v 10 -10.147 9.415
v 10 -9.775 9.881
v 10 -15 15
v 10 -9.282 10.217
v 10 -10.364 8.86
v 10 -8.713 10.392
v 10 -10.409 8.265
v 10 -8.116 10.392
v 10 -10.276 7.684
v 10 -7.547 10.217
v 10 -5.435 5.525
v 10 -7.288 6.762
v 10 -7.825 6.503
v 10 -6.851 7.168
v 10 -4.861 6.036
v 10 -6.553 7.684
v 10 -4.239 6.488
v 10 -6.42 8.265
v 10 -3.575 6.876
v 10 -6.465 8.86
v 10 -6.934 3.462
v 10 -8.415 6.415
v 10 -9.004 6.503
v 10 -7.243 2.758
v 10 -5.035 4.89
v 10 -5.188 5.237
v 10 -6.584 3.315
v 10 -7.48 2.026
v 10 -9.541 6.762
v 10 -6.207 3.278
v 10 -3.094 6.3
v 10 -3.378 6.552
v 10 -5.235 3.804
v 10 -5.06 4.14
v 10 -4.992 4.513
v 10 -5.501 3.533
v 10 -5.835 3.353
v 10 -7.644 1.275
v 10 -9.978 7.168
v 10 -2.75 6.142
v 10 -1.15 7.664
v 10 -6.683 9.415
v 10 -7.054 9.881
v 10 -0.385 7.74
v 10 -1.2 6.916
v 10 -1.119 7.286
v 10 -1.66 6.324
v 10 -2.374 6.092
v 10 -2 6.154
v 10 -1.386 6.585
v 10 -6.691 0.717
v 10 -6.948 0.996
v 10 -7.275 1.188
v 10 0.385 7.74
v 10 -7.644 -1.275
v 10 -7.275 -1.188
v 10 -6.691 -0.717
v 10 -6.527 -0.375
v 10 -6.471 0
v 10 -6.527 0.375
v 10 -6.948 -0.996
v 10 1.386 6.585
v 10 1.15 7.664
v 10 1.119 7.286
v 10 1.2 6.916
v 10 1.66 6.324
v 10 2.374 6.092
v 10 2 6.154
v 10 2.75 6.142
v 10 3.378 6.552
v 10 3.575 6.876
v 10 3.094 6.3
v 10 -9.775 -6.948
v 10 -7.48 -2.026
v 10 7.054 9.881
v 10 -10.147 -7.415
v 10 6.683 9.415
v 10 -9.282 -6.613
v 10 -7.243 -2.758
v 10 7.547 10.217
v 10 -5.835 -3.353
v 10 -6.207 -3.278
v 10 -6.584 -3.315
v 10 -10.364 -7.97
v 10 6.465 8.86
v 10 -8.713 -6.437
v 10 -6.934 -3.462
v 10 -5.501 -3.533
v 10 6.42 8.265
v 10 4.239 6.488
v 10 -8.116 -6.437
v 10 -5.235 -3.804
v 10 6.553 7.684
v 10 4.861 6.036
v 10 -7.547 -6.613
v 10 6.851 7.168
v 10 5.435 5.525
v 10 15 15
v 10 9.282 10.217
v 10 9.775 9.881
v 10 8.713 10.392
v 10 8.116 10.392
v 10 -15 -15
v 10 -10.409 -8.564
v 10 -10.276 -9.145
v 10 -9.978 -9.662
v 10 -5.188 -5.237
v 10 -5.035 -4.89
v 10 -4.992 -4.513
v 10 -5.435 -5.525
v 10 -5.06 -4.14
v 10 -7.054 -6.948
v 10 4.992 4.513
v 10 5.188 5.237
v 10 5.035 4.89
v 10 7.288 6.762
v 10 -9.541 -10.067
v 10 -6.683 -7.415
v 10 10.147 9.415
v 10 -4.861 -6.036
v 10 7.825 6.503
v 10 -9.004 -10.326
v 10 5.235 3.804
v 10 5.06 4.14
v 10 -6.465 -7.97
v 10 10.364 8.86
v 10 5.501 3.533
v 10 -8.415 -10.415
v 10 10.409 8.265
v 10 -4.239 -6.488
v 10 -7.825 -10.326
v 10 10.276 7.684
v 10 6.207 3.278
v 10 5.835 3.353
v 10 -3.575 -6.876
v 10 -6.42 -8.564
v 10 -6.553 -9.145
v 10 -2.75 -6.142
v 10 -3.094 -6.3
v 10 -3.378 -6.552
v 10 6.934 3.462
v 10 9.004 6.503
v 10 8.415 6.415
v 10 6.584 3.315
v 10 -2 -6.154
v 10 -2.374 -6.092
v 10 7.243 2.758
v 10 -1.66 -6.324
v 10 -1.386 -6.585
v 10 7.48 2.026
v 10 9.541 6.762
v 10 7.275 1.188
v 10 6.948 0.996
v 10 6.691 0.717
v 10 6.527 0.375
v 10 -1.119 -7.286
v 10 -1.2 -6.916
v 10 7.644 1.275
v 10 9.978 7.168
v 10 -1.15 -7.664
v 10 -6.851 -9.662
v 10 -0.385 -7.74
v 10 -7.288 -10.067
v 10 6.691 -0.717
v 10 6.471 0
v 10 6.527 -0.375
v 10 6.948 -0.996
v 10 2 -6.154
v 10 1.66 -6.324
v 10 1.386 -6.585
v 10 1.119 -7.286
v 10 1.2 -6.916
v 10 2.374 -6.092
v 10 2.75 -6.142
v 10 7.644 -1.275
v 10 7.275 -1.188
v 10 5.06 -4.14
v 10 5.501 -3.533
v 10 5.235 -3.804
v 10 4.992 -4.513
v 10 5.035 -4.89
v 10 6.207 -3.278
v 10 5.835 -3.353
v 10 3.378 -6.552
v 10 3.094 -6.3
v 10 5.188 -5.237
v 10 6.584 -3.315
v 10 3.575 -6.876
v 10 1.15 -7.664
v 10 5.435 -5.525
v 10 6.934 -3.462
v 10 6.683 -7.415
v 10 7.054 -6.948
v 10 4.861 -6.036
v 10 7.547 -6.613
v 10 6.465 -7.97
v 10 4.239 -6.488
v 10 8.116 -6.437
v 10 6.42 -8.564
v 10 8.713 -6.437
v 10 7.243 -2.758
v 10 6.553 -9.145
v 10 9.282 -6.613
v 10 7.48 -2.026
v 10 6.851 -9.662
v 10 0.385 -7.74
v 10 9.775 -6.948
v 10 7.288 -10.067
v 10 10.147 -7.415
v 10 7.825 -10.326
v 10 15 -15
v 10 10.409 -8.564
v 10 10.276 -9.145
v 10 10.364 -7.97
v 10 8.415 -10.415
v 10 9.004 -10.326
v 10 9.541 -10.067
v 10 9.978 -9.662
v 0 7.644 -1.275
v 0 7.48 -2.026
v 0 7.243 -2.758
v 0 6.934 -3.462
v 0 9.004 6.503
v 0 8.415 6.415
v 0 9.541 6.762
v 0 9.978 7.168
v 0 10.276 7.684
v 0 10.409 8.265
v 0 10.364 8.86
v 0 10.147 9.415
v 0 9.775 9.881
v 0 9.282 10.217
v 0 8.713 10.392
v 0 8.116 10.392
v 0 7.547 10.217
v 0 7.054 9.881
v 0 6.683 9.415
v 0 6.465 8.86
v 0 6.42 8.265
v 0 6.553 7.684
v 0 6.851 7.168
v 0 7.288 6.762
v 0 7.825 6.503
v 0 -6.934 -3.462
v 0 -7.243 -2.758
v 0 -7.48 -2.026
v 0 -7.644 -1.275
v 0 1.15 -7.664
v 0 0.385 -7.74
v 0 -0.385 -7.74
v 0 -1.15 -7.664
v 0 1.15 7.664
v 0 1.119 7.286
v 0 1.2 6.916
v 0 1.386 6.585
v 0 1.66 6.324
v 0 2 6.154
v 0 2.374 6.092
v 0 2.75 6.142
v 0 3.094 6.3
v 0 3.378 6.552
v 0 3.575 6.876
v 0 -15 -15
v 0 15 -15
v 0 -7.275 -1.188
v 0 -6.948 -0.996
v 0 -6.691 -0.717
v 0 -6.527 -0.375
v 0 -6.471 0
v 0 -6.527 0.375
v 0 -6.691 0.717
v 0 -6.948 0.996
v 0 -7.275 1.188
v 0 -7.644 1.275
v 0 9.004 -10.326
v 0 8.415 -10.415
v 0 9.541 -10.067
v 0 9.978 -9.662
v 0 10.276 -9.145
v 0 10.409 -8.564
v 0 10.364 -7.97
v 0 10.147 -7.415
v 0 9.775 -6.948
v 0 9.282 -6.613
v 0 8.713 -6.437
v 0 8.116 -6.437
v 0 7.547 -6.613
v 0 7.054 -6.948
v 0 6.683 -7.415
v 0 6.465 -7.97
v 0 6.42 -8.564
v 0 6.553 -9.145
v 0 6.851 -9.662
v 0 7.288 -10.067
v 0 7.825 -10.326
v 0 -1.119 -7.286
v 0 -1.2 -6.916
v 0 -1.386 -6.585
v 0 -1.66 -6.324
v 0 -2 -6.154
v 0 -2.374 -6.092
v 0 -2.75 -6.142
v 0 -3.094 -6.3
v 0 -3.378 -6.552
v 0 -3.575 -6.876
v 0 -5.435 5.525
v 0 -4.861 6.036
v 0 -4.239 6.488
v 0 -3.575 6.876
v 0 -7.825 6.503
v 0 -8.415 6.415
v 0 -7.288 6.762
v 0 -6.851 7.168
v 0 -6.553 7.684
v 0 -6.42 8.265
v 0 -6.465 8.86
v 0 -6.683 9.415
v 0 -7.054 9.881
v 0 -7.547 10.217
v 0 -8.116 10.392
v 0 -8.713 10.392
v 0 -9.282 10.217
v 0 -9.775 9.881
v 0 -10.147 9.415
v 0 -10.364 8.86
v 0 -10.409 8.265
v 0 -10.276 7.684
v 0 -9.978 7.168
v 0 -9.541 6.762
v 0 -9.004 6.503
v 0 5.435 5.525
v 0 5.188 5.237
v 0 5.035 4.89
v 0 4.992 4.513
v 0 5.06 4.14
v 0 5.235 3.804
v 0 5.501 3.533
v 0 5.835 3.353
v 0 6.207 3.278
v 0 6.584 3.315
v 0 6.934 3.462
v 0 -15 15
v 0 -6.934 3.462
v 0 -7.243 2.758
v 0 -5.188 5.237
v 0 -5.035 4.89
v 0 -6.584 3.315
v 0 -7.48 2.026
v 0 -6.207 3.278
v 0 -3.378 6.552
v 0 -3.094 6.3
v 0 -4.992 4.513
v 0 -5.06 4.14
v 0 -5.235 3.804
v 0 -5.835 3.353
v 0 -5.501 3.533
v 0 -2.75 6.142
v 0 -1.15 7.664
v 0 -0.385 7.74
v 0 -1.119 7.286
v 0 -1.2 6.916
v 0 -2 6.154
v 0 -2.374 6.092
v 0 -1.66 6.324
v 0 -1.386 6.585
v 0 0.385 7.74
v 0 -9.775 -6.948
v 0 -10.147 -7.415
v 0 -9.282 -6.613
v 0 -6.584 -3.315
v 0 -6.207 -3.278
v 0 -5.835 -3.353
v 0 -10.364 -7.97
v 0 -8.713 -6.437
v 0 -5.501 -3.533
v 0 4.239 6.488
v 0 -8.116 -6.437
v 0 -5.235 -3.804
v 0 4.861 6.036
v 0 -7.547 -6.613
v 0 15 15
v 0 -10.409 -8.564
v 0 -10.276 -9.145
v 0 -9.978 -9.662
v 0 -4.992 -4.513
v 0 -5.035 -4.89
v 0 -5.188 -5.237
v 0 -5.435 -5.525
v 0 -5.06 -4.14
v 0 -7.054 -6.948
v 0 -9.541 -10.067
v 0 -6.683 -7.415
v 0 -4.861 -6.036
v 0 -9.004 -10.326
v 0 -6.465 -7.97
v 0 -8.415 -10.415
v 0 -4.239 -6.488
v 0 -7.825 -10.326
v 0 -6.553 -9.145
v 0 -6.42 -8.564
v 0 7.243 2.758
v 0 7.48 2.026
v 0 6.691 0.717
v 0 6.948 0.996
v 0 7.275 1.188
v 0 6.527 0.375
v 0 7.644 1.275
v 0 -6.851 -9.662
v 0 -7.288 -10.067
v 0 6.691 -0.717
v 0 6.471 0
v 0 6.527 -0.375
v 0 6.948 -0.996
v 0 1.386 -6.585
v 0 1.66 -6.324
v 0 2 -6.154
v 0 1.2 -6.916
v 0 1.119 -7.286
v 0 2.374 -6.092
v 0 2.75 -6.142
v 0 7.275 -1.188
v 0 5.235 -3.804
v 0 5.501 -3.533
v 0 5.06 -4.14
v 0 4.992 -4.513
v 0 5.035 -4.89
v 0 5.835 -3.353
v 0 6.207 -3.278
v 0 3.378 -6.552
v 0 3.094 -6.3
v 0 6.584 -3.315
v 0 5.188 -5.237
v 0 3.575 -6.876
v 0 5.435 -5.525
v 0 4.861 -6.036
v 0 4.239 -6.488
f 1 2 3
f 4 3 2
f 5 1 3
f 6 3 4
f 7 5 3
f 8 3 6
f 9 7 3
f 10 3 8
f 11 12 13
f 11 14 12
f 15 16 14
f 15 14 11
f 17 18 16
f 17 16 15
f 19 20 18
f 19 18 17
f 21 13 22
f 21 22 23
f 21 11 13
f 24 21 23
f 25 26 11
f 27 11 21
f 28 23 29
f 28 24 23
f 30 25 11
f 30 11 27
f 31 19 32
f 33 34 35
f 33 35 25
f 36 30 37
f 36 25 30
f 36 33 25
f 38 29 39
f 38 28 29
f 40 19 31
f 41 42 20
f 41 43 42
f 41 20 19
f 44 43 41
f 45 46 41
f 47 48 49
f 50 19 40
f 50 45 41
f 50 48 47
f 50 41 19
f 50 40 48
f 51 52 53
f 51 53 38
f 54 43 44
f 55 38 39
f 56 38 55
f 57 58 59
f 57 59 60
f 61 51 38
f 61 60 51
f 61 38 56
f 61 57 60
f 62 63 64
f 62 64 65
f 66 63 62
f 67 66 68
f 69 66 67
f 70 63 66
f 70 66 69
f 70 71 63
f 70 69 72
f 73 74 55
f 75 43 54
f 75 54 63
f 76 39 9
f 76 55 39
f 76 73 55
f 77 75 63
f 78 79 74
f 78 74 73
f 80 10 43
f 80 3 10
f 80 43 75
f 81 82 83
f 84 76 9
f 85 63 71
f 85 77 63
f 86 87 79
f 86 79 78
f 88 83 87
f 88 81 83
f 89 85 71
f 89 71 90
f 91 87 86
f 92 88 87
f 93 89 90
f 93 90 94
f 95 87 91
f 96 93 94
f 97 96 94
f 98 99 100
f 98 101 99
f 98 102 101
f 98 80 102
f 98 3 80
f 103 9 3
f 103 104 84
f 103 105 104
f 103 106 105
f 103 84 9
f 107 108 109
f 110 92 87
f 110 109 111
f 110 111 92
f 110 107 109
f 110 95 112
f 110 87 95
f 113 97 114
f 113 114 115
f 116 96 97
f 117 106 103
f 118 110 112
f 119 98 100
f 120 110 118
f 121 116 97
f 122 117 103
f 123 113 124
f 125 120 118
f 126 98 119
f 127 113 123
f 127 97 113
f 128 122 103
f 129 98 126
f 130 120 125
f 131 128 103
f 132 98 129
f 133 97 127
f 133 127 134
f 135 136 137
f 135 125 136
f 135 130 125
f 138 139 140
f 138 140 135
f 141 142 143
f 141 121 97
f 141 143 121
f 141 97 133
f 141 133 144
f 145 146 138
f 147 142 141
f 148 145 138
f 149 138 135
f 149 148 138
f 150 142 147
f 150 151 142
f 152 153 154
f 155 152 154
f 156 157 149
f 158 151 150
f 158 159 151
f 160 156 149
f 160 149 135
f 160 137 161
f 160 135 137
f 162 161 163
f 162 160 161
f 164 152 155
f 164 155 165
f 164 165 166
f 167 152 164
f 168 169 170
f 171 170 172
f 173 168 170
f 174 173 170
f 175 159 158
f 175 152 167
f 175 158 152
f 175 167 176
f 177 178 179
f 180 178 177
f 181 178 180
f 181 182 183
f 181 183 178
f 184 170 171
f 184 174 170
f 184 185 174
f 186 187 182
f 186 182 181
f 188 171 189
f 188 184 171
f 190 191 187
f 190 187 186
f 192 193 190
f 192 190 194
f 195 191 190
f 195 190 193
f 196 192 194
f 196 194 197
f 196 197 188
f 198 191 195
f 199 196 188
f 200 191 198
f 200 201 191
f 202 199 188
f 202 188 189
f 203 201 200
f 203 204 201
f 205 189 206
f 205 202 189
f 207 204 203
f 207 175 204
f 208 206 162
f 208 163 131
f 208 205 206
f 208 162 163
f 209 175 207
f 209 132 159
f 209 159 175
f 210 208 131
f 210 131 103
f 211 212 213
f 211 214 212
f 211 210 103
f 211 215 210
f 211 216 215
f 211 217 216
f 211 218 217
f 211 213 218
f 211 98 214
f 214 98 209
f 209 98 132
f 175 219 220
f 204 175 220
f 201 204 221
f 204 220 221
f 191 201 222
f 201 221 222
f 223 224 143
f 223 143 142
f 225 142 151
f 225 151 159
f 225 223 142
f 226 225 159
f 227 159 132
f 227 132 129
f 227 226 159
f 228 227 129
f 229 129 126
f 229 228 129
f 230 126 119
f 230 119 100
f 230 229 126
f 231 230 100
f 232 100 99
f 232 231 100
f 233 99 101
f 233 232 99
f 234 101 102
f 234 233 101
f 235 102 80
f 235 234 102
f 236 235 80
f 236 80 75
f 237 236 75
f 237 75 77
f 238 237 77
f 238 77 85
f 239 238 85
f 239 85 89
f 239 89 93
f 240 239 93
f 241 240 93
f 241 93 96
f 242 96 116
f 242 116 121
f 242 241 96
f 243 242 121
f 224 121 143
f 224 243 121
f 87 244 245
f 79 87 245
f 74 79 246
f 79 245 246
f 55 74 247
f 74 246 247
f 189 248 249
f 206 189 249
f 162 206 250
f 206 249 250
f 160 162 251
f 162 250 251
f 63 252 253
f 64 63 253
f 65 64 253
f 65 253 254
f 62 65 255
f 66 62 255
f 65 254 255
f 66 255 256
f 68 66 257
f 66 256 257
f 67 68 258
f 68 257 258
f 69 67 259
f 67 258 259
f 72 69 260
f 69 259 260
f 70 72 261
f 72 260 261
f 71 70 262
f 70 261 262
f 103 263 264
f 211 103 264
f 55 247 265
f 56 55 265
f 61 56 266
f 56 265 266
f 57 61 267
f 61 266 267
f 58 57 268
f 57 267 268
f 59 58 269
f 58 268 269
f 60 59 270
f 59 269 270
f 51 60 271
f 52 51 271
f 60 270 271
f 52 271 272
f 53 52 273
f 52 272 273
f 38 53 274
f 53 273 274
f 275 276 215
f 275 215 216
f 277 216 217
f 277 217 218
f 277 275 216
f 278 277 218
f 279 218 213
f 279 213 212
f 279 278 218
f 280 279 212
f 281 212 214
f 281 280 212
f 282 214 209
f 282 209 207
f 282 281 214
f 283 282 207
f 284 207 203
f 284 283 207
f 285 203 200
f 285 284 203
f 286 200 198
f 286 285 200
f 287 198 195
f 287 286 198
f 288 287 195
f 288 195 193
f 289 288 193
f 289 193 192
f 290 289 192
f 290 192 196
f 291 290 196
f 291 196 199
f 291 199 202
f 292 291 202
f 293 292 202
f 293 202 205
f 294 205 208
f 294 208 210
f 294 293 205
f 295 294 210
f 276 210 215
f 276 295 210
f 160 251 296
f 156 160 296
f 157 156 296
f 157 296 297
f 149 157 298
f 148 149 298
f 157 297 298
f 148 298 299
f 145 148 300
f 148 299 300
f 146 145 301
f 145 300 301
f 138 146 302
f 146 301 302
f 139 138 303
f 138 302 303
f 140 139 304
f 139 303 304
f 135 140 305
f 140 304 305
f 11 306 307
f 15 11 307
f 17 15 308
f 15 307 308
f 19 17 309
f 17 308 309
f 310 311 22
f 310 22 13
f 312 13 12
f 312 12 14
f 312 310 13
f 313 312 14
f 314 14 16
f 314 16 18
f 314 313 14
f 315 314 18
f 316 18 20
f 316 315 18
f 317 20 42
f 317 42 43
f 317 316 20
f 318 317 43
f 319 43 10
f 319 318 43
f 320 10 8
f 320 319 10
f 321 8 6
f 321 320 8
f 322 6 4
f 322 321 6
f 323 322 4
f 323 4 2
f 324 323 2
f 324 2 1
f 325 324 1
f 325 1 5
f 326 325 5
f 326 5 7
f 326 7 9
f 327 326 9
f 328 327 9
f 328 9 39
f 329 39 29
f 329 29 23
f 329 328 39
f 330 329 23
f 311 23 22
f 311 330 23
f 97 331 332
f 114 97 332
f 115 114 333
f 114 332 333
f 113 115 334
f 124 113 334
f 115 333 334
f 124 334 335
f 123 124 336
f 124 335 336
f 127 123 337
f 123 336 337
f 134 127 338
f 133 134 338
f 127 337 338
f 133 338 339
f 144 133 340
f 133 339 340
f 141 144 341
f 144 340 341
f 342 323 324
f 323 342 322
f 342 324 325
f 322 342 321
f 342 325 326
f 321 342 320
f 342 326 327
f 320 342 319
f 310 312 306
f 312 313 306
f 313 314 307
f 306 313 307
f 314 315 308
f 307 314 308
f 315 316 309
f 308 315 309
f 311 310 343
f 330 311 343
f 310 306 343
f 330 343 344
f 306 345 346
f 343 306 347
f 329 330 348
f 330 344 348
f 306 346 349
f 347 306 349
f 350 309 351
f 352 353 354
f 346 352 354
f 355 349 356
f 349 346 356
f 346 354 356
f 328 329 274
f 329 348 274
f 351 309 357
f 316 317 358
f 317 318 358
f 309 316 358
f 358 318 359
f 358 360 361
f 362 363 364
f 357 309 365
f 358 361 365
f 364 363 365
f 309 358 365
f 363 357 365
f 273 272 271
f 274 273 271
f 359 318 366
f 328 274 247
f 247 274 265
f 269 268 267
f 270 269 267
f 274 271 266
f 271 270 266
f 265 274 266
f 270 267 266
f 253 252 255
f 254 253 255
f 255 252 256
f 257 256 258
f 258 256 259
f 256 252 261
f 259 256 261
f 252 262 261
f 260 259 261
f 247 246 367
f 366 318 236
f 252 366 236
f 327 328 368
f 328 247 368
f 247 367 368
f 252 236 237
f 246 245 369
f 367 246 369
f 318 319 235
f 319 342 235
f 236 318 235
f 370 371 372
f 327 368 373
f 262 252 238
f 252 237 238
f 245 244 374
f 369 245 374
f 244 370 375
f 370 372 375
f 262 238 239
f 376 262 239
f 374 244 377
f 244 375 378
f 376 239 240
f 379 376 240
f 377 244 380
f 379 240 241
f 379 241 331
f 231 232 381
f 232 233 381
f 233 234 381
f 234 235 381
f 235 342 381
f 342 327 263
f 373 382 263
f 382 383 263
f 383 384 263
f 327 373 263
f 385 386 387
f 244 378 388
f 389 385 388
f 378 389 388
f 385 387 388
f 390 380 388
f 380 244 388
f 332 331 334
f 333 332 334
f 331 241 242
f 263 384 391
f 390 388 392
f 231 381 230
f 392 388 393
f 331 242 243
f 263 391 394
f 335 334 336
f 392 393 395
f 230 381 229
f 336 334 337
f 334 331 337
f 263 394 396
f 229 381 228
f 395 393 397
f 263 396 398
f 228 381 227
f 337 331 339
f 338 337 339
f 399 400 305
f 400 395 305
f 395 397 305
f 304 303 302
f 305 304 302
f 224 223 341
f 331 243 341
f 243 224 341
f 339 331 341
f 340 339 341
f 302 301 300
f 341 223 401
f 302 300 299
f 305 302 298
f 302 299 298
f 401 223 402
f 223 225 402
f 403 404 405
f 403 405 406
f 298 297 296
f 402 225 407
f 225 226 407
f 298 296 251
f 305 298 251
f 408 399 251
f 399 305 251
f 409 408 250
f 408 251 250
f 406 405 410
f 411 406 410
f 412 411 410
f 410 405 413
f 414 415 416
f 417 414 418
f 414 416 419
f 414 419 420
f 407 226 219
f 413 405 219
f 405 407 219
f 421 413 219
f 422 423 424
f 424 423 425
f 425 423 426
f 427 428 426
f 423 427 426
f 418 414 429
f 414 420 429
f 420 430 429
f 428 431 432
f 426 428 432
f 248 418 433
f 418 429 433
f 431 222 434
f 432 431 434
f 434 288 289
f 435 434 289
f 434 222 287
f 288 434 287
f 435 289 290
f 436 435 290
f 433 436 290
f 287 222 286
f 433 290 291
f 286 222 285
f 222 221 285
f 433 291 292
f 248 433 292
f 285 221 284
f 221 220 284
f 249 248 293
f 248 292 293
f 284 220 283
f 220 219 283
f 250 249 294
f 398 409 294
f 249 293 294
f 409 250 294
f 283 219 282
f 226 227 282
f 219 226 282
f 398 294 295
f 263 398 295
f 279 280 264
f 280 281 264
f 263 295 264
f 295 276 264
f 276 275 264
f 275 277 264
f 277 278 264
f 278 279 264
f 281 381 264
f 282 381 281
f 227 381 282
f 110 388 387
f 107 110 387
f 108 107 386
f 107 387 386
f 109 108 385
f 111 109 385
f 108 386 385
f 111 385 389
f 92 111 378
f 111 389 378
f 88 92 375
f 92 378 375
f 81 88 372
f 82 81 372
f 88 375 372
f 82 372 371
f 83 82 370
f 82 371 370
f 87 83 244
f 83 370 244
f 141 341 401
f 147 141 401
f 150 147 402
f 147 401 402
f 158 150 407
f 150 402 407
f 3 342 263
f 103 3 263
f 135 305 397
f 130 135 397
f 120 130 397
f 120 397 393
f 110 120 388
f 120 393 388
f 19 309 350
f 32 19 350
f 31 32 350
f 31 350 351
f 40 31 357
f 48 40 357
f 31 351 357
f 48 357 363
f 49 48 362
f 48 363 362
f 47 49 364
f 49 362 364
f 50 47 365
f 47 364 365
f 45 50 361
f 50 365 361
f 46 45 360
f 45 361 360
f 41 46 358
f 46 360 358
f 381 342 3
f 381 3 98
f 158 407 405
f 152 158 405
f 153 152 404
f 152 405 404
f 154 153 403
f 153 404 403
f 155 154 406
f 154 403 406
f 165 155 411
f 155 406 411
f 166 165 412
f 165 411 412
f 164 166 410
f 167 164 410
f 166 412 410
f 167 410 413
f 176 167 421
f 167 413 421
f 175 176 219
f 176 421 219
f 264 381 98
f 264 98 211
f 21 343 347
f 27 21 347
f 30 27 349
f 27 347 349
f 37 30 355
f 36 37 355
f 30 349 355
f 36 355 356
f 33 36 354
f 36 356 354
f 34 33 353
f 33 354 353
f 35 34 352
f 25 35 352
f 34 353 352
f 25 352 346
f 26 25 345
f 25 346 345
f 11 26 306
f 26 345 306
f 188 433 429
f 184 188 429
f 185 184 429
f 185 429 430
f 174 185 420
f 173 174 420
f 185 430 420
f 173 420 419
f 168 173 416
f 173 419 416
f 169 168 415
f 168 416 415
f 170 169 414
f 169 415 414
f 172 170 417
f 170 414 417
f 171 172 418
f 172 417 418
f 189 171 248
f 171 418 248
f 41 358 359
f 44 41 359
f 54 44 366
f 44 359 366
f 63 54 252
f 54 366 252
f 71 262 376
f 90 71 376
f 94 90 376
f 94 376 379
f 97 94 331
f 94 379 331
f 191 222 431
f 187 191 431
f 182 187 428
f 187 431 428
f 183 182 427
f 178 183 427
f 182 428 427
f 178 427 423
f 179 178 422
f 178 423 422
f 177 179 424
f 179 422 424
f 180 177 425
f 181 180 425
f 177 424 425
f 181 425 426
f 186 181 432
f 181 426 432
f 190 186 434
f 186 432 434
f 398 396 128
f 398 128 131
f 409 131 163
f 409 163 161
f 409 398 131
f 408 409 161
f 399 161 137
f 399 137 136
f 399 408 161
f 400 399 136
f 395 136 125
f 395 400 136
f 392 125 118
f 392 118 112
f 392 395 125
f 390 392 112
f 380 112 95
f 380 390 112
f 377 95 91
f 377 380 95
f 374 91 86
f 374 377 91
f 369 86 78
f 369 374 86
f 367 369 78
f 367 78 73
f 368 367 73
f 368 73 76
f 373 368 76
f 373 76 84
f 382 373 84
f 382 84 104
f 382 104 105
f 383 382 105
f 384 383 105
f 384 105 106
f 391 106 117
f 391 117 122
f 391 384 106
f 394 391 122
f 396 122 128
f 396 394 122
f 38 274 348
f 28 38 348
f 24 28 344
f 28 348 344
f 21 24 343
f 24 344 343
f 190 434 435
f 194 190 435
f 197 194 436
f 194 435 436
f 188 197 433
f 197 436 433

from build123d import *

# Parameters (mm, degrees)
SKETCH1_W           = 30
SKETCH1_H           = 30
SKETCH1_R           = 2
BOSS_EXTRUDE1_DEPTH = 10


with BuildPart() as part:
    # Sketch1 → Boss-Extrude1 (new body)
    with BuildSketch(Plane(origin=(0, 0, 0), x_dir=(0, 0, -1), z_dir=(1, 0, 0))):
        Rectangle(SKETCH1_W, SKETCH1_H)
        with Locations((8.414570696, 8.414570696)):
            Circle(SKETCH1_R, mode=Mode.SUBTRACT)
        with Locations((8.414570696, -8.414570696)):
            Circle(SKETCH1_R, mode=Mode.SUBTRACT)
        with Locations((-8.414570696, -8.414570696)):
            Circle(SKETCH1_R, mode=Mode.SUBTRACT)
        with Locations((-8.414570696, 8.414570696)):
            Circle(SKETCH1_R, mode=Mode.SUBTRACT)
        with BuildLine():
            ThreePointArc((-1.274653828, 7.644459276), (0, 6.470984275), (1.274653828, 7.644459276))
            ThreePointArc((1.274653828, 7.644459276), (2.394881706, 7.370688001), (3.462083815, 6.933720189))
            ThreePointArc((3.462083815, 6.933720189), (3.803549125, 5.235136249), (5.524517033, 5.435274745))
            ThreePointArc((5.524517033, 5.435274745), (6.269881706, 4.555335705), (6.876423113, 3.574535658))
            ThreePointArc((6.876423113, 3.574535658), (6.154271761, 1.999644111), (7.664202503, 1.15))
            ThreePointArc((7.664202503, 1.15), (7.75, 0), (7.664202503, -1.15))
            ThreePointArc((7.664202503, -1.15), (6.154271761, -1.999644111), (6.876423113, -3.574535658))
            ThreePointArc((6.876423113, -3.574535658), (6.269881706, -4.555335705), (5.524517033, -5.435274745))
            ThreePointArc((5.524517033, -5.435274745), (3.803549125, -5.235136249), (3.462083815, -6.933720189))
            ThreePointArc((3.462083815, -6.933720189), (2.394881706, -7.370688001), (1.274653828, -7.644459276))
            ThreePointArc((1.274653828, -7.644459276), (0, -6.470984275), (-1.274653828, -7.644459276))
            ThreePointArc((-1.274653828, -7.644459276), (-2.394881706, -7.370688001), (-3.462083815, -6.933720189))
            ThreePointArc((-3.462083815, -6.933720189), (-3.803549125, -5.235136249), (-5.524517033, -5.435274745))
            ThreePointArc((-5.524517033, -5.435274745), (-6.269881706, -4.555335705), (-6.876423113, -3.574535658))
            ThreePointArc((-6.876423113, -3.574535658), (-6.154271761, -1.999644111), (-7.664202503, -1.15))
            ThreePointArc((-7.664202503, -1.15), (-7.75, 0), (-7.664202503, 1.15))
            ThreePointArc((-7.664202503, 1.15), (-6.154271761, 1.999644111), (-6.876423113, 3.574535658))
            ThreePointArc((-6.876423113, 3.574535658), (-6.269881706, 4.555335705), (-5.524517033, 5.435274745))
            ThreePointArc((-5.524517033, 5.435274745), (-3.803549125, 5.235136249), (-3.462083815, 6.933720189))
            ThreePointArc((-3.462083815, 6.933720189), (-2.394881706, 7.370688001), (-1.274653828, 7.644459276))
        make_face(mode=Mode.SUBTRACT)
    extrude(amount=BOSS_EXTRUDE1_DEPTH)


solid = part.part
